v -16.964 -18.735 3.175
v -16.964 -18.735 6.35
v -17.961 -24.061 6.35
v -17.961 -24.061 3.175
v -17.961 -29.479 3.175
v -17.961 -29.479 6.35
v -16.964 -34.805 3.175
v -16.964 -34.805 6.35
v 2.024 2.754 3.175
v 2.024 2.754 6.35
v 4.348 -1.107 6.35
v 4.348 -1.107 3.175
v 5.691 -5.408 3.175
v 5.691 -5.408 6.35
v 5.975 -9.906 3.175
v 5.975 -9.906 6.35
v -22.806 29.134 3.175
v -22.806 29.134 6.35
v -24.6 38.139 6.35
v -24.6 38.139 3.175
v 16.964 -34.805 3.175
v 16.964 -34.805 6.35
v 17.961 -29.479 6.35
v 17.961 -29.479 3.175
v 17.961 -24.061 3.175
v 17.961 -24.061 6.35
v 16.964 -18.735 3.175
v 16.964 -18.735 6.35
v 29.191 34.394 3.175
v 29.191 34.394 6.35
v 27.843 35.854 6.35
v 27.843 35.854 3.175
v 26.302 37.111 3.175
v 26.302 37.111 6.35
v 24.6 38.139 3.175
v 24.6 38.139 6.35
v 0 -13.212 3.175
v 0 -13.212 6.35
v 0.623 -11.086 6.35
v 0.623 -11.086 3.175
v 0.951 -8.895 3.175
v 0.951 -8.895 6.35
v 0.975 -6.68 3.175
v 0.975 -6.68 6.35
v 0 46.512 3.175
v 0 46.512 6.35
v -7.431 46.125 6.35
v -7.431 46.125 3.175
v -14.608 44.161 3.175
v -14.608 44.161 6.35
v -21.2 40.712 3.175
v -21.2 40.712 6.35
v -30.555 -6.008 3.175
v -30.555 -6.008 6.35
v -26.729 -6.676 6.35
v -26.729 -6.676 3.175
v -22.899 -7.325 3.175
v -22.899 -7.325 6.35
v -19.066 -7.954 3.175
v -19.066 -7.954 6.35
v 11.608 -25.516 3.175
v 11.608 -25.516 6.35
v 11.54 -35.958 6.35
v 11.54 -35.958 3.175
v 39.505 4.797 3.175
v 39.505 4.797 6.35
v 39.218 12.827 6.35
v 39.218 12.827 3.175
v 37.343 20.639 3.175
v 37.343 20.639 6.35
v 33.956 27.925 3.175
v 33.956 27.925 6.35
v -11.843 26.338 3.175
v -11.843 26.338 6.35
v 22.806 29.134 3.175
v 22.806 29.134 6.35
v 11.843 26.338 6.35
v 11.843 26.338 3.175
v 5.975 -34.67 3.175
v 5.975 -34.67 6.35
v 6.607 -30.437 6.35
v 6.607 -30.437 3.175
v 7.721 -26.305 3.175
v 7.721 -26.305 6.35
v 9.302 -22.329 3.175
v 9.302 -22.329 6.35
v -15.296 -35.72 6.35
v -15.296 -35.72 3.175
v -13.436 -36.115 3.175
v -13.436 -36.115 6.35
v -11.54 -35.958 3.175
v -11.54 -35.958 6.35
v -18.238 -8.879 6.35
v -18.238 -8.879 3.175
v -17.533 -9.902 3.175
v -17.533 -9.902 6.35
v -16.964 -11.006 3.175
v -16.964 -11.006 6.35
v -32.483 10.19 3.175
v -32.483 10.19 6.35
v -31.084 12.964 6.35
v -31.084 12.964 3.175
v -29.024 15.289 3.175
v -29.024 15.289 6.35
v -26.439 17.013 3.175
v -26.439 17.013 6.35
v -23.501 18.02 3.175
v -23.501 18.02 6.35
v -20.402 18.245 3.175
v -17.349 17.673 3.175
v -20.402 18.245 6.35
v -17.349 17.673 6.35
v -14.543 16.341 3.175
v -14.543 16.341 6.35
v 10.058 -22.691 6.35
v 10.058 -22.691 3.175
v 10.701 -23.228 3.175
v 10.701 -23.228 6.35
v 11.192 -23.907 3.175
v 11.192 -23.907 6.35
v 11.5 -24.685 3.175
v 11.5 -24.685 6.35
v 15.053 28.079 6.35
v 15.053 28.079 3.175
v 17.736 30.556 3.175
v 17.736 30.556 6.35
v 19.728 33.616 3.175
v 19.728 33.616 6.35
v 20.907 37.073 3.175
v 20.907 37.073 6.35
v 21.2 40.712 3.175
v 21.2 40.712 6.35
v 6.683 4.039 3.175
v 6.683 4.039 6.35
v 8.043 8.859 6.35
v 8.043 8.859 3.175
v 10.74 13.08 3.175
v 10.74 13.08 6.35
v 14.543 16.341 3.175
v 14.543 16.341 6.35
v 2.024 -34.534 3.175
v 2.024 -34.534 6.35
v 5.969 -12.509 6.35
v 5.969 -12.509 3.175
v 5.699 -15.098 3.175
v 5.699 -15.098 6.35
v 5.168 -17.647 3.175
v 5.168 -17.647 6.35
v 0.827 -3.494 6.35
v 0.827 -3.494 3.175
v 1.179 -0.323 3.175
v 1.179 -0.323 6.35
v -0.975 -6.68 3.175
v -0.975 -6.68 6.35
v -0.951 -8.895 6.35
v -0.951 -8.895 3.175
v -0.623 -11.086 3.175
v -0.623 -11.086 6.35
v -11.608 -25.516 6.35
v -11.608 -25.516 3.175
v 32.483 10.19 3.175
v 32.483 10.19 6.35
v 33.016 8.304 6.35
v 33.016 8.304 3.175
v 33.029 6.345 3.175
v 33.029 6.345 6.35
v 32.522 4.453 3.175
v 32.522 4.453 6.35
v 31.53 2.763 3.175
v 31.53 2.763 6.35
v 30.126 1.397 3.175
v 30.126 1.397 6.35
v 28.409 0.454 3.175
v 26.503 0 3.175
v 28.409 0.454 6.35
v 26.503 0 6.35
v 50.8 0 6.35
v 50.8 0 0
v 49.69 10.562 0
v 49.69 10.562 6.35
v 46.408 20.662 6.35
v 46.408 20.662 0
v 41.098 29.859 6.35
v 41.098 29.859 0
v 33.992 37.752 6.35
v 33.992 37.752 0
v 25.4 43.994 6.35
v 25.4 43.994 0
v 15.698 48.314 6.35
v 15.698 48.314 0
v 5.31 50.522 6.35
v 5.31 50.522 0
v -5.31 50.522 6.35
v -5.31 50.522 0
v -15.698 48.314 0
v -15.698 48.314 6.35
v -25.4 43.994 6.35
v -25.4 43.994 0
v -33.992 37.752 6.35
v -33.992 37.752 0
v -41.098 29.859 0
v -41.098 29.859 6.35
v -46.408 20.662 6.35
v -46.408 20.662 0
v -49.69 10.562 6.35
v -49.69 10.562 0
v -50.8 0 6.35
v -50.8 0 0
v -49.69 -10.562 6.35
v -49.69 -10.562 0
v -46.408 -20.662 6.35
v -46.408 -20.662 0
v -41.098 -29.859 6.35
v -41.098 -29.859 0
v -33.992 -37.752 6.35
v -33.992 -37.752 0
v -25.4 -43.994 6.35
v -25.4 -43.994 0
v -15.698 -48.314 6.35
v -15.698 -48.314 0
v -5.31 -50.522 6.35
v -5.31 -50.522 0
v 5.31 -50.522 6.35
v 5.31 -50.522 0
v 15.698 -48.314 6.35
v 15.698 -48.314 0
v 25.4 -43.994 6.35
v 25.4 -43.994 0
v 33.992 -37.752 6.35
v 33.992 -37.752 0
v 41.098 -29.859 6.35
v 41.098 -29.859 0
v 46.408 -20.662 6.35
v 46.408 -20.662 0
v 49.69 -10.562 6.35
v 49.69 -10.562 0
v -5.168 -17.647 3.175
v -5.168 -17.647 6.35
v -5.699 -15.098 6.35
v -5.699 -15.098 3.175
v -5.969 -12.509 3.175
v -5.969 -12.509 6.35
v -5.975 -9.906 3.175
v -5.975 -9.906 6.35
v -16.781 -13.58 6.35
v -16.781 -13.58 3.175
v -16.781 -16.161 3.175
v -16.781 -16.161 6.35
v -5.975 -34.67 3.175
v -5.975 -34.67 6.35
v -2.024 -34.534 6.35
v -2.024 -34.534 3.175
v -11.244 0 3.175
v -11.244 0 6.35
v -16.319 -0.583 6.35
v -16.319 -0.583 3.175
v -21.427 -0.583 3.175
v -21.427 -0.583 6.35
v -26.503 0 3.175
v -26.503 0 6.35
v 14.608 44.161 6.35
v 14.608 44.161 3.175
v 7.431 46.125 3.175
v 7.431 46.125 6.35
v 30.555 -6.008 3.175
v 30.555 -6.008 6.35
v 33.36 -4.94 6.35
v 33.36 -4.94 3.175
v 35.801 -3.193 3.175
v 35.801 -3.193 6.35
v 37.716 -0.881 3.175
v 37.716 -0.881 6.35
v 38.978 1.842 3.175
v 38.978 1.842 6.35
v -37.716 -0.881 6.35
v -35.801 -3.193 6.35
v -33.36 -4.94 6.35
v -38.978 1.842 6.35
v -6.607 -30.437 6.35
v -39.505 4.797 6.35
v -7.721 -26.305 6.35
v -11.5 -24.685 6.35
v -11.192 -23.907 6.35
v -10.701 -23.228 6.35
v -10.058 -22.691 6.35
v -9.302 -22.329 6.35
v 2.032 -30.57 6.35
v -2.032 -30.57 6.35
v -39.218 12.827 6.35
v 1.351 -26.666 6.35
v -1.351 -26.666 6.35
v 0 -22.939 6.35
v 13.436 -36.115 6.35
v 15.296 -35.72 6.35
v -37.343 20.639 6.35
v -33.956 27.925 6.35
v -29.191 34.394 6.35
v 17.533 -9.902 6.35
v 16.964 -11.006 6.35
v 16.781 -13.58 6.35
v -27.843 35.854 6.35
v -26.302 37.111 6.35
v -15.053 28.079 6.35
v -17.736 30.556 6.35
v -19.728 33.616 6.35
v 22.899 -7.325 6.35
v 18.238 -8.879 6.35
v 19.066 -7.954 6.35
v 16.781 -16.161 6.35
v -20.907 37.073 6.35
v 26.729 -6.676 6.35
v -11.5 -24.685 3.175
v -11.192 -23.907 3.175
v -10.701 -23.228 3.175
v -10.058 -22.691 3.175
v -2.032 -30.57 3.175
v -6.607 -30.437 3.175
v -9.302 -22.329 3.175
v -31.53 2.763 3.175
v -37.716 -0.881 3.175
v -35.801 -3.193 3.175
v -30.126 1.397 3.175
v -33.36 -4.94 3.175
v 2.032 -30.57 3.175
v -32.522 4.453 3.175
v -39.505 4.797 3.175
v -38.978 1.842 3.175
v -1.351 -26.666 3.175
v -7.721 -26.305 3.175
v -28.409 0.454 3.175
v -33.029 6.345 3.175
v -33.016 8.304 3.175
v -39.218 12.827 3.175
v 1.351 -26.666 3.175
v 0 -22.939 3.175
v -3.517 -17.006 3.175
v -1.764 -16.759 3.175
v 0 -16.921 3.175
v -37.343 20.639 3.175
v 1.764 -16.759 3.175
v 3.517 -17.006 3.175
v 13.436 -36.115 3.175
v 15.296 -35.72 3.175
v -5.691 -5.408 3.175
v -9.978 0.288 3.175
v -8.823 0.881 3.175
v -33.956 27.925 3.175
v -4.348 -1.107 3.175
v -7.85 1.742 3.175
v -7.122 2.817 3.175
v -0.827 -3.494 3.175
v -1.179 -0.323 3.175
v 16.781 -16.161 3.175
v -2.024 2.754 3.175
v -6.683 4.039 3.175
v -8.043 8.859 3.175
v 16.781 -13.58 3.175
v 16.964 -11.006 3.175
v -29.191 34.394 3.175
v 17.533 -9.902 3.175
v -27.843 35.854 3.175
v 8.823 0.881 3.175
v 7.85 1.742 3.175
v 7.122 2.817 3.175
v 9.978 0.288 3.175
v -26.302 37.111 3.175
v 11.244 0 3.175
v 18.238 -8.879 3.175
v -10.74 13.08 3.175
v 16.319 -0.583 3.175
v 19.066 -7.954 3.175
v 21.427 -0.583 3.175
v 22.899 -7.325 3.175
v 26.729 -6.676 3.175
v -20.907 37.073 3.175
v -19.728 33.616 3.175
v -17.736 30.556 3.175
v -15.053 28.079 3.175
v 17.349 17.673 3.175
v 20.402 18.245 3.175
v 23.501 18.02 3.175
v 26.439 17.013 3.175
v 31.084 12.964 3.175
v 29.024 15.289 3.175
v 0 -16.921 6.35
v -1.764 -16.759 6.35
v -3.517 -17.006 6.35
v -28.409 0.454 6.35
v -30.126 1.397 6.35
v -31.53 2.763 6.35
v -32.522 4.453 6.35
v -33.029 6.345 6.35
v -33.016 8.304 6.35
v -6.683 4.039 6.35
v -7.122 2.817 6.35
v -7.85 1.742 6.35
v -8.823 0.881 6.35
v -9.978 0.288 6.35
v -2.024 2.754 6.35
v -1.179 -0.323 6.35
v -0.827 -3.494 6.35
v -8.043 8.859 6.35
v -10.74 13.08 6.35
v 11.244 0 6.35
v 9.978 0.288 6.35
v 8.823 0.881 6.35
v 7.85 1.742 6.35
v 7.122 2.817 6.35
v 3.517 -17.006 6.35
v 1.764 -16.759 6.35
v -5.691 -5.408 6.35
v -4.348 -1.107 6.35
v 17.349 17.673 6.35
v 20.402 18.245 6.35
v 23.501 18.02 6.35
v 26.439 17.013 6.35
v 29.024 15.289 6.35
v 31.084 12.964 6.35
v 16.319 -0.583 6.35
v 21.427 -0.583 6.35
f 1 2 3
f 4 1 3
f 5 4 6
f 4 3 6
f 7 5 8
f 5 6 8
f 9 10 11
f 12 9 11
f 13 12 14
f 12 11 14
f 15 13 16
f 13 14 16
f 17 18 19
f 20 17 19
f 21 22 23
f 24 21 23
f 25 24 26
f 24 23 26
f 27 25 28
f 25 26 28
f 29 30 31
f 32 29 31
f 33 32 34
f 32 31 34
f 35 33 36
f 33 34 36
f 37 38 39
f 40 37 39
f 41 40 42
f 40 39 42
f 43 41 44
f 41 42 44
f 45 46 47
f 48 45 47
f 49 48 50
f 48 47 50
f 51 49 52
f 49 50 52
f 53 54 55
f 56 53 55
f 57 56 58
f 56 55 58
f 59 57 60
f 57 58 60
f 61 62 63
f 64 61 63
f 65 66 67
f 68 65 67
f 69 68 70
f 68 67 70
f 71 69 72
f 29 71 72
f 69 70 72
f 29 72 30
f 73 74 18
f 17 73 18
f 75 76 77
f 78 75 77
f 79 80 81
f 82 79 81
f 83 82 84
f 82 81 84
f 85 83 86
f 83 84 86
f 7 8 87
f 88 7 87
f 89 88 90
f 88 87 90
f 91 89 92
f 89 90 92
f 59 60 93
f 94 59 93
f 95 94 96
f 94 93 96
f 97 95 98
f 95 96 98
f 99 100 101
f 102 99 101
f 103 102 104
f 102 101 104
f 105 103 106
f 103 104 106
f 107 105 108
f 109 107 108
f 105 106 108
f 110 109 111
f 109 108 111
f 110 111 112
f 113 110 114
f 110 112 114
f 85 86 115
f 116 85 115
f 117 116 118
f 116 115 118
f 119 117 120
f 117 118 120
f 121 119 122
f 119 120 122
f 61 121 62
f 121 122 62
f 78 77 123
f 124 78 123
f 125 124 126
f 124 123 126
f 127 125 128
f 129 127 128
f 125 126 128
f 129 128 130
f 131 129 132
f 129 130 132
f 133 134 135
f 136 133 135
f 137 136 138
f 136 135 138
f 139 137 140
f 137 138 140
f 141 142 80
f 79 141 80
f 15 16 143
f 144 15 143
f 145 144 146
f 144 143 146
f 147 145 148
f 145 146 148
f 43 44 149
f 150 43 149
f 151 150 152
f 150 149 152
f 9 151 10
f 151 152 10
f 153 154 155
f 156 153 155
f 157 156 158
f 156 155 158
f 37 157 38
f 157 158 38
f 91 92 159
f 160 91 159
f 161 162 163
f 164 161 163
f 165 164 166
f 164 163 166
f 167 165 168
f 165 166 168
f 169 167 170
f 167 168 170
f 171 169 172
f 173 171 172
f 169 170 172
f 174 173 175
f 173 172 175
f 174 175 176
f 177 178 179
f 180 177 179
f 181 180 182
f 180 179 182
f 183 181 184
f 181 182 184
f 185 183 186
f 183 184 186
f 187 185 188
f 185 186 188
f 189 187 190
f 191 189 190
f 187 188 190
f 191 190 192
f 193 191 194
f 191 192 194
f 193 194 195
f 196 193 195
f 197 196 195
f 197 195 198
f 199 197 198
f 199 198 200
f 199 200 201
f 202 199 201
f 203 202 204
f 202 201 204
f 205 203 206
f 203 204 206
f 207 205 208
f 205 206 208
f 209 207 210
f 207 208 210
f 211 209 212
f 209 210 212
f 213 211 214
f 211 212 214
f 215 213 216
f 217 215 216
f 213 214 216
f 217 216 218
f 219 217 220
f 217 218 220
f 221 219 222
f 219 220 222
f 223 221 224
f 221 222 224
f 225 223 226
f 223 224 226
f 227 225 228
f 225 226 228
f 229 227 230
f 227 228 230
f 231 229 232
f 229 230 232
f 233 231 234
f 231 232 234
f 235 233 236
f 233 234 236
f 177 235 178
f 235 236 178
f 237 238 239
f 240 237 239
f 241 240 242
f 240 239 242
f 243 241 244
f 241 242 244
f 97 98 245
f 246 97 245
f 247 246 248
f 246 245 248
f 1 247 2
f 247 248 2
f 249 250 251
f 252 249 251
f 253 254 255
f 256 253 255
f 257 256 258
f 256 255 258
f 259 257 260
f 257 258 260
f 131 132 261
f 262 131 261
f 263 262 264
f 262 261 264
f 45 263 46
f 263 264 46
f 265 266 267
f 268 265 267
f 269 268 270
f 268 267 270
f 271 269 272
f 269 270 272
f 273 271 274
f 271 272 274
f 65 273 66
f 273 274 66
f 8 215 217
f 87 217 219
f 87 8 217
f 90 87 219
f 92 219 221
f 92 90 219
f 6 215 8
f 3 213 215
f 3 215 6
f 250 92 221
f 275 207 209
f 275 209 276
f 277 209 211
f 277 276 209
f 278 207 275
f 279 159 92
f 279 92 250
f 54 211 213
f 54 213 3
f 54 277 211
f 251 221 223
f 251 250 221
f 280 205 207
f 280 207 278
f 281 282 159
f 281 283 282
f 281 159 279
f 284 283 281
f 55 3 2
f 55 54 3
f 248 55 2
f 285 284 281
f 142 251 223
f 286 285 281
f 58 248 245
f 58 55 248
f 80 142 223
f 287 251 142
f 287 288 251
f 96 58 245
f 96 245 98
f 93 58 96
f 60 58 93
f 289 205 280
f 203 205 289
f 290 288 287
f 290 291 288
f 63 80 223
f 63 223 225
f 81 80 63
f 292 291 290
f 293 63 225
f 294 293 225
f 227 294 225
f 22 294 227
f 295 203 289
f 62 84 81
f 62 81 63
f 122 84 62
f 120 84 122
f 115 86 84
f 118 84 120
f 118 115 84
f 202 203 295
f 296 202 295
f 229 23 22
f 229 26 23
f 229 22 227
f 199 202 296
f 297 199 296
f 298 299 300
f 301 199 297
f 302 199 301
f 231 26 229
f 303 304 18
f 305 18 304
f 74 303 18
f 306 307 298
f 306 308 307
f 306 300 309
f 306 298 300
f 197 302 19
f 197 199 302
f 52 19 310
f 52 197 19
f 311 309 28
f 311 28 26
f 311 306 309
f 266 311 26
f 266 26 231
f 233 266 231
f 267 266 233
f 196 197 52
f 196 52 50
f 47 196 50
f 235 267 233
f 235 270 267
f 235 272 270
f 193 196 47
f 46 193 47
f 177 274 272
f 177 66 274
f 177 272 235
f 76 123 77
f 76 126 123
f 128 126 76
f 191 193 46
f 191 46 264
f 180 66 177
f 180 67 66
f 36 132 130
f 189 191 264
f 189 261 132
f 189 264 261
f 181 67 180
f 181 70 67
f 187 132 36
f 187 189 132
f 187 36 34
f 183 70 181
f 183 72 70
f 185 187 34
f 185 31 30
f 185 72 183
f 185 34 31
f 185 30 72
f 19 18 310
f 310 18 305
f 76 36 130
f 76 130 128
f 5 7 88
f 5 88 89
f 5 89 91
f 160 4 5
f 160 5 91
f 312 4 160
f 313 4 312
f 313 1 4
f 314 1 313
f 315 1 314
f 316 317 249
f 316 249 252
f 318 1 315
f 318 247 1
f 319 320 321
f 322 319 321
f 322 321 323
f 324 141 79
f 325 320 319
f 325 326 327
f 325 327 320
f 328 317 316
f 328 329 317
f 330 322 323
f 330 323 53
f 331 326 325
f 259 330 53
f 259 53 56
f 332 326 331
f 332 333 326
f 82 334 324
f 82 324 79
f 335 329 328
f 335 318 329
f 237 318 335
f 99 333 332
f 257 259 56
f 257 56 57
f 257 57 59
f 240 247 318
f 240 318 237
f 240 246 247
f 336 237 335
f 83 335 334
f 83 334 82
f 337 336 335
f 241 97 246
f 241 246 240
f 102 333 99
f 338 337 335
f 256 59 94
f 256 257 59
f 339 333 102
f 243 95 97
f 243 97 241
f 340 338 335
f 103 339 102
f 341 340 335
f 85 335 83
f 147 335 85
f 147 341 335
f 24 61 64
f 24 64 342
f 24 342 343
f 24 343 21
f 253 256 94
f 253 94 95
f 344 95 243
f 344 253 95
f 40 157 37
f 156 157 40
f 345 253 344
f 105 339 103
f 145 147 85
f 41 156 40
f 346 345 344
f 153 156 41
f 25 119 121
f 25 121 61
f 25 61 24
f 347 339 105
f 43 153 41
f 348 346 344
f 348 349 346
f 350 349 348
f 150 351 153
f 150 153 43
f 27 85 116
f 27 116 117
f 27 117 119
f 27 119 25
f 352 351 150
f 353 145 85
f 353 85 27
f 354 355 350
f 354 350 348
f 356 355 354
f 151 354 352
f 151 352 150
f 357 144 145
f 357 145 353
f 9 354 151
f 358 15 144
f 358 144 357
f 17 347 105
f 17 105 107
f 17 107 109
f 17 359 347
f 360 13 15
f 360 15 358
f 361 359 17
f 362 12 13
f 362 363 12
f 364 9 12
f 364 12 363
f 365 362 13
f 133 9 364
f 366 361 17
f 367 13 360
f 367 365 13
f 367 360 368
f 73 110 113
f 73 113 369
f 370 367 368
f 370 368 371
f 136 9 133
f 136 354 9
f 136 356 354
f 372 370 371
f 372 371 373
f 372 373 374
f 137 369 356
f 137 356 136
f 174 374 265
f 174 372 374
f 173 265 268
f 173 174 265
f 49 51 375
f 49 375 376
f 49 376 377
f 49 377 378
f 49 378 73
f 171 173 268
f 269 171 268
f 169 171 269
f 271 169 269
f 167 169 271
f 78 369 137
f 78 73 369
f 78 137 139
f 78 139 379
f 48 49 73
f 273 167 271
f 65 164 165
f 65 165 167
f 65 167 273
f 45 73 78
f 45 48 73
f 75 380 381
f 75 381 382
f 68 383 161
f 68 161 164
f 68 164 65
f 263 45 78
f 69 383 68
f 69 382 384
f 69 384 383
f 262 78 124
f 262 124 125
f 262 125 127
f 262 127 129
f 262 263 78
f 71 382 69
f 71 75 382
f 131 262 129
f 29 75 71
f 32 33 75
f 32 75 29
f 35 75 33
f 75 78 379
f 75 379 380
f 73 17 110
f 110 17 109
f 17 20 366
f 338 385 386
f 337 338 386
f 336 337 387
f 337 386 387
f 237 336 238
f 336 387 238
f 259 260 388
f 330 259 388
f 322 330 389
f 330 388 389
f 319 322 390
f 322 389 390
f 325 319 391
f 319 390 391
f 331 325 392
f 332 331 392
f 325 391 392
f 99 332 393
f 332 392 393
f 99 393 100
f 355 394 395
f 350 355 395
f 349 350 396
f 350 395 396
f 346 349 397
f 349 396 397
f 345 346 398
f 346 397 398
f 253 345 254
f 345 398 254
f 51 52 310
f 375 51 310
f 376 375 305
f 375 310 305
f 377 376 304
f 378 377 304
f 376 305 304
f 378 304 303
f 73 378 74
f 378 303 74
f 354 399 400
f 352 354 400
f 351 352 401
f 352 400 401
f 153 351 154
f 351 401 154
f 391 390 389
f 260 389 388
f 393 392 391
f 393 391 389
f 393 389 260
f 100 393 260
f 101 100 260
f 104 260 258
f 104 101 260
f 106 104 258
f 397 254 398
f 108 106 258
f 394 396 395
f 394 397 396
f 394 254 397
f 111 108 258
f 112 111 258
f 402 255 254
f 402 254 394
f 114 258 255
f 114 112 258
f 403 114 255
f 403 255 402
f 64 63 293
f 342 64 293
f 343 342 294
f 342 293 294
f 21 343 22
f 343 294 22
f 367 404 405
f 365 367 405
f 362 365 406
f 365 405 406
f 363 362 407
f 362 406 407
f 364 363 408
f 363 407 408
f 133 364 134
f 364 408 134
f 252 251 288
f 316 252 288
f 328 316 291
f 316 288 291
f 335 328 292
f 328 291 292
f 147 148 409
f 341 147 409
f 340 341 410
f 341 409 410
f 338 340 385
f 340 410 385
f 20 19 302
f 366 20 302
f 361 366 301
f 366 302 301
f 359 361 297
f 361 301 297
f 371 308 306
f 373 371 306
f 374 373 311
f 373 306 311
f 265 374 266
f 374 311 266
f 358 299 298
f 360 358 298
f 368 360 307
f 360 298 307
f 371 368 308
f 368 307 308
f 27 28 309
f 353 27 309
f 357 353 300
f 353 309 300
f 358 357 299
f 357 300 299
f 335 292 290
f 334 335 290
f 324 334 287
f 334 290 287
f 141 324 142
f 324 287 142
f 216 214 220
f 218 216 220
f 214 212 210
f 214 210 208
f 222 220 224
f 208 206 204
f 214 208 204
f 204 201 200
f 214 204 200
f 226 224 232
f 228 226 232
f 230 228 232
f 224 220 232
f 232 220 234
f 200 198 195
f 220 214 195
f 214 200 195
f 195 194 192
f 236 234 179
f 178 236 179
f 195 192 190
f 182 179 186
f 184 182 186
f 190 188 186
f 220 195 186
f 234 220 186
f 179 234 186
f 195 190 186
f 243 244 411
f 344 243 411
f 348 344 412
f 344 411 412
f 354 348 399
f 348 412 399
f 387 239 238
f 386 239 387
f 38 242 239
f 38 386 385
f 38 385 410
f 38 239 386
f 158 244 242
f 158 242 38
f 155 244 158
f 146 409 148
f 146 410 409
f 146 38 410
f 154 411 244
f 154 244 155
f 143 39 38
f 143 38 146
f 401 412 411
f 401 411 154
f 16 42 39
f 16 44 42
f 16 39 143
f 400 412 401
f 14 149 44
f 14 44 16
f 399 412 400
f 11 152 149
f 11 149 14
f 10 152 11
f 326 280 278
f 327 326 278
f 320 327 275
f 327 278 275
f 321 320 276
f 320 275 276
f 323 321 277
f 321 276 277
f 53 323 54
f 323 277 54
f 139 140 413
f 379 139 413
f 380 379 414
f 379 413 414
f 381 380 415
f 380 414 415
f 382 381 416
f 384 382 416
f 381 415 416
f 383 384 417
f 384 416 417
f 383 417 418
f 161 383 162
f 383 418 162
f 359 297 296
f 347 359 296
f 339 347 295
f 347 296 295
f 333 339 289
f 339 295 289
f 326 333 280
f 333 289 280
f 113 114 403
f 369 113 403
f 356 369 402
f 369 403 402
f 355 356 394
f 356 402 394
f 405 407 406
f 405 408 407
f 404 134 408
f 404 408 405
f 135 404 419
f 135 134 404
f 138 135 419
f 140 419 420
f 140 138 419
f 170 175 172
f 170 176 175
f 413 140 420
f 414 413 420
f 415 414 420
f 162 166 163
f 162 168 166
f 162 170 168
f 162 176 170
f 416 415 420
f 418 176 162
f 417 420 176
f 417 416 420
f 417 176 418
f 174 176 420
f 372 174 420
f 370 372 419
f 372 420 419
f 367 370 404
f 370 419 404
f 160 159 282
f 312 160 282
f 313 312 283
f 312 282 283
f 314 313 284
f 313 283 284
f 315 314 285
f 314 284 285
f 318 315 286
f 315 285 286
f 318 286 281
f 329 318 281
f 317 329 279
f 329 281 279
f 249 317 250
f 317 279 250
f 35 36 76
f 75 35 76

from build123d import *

# Parameters (mm, degrees)
F0_R     = 50.8
F1_DEPTH = 6.35
F3_DEPTH = 3.175


with BuildPart() as f1:
    # F0 (on Top) → F1 (new body)
    with BuildSketch(Plane.XY):
        Circle(F0_R)
    extrude(amount=F1_DEPTH)

    # F2 (on face) → F3 (cut)
    with BuildSketch(Plane.XY.offset(6.35)):
        with BuildLine():
            ThreePointArc((-2.023529, -34.533925), (-1.777175, -28.603001), (0, -22.939239))
            ThreePointArc((0, -22.939239), (1.777175, -28.603001), (2.023529, -34.533925))
            Line((2.023529, -34.533925), (5.974615, -34.669533))
            ThreePointArc((5.974615, -34.669533), (7.104242, -28.355202), (9.302336, -22.328991))
            ThreePointArc((9.302336, -22.328991), (10.967211, -23.551895), (11.607712, -25.515836))
            Line((11.607712, -25.515836), (11.539907, -35.957832))
            ThreePointArc((11.539907, -35.957832), (14.380524, -35.985773), (16.96432, -34.805145))
            ThreePointArc((16.96432, -34.805145), (18.085967, -26.770231), (16.96432, -18.735318))
            ThreePointArc((16.96432, -18.735318), (16.7578, -14.870423), (16.96432, -11.005528))
            ThreePointArc((16.96432, -11.005528), (17.869083, -9.379184), (19.066282, -7.954295))
            ThreePointArc((19.066282, -7.954295), (24.814172, -7.002965), (30.554628, -6.007752))
            ThreePointArc((30.554628, -6.007752), (36.833108, -2.099002), (39.505046, 4.797257))
            ThreePointArc((39.505046, 4.797257), (37.343339, 20.639318), (29.19136, 34.393921))
            ThreePointArc((29.19136, 34.393921), (27.094397, 36.509907), (24.600387, 38.139191))
            Line((24.600387, 38.139191), (22.805873, 29.13427))
            Line((22.805873, 29.13427), (11.843341, 26.337616))
            ThreePointArc((11.843341, 26.337616), (18.827134, 32.024386), (21.200456, 40.712312))
            ThreePointArc((21.200456, 40.712312), (11.071856, 45.336169), (0, 46.512008))
            ThreePointArc((0, 46.512008), (-11.071856, 45.336169), (-21.200456, 40.712312))
            ThreePointArc((-21.200456, 40.712312), (-18.827134, 32.024386), (-11.843341, 26.337616))
            Line((-11.843341, 26.337616), (-22.805873, 29.13427))
            Line((-22.805873, 29.13427), (-24.600387, 38.139191))
            ThreePointArc((-24.600387, 38.139191), (-27.094397, 36.509907), (-29.19136, 34.393921))
            ThreePointArc((-29.19136, 34.393921), (-37.343339, 20.639318), (-39.505046, 4.797257))
            ThreePointArc((-39.505046, 4.797257), (-36.833108, -2.099002), (-30.554628, -6.007752))
            ThreePointArc((-30.554628, -6.007752), (-24.814172, -7.002965), (-19.066282, -7.954295))
            ThreePointArc((-19.066282, -7.954295), (-17.869083, -9.379184), (-16.96432, -11.005528))
            ThreePointArc((-16.96432, -11.005528), (-16.7578, -14.870423), (-16.96432, -18.735318))
            ThreePointArc((-16.96432, -18.735318), (-18.085967, -26.770231), (-16.96432, -34.805145))
            ThreePointArc((-16.96432, -34.805145), (-14.380524, -35.985773), (-11.539907, -35.957832))
            Line((-11.539907, -35.957832), (-11.607712, -25.515836))
            ThreePointArc((-11.607712, -25.515836), (-10.967211, -23.551895), (-9.302336, -22.328991))
            ThreePointArc((-9.302336, -22.328991), (-7.104242, -28.355202), (-5.974615, -34.669533))
            Line((-5.974615, -34.669533), (-2.023529, -34.533925))
        make_face()
        with BuildLine():
            ThreePointArc((-2.023529, 2.753796), (-0.940643, -1.901231), (-0.975282, -6.680429))
            ThreePointArc((-0.975282, -6.680429), (-0.824525, -9.996426), (0, -13.211815))
            ThreePointArc((0, -13.211815), (0.824525, -9.996426), (0.975282, -6.680429))
            ThreePointArc((0.975282, -6.680429), (0.940643, -1.901231), (2.023529, 2.753796))
            ThreePointArc((2.023529, 2.753796), (5.148448, -3.217282), (5.974615, -9.905805))
            ThreePointArc((5.974615, -9.905805), (5.866823, -13.807024), (5.168271, -17.646706))
            ThreePointArc((5.168271, -17.646706), (2.647612, -16.831793), (0, -16.920999))
            ThreePointArc((0, -16.920999), (-2.647612, -16.831793), (-5.168271, -17.646706))
            ThreePointArc((-5.168271, -17.646706), (-5.866823, -13.807024), (-5.974615, -9.905805))
            ThreePointArc((-5.974615, -9.905805), (-5.148448, -3.217282), (-2.023529, 2.753796))
        make_face(mode=Mode.SUBTRACT)
        with BuildLine():
            ThreePointArc((-26.502606, 0), (-32.082928, 3.574671), (-32.482646, 10.189692))
            ThreePointArc((-32.482646, 10.189692), (-25.002638, 17.61113), (-14.542522, 16.340593))
            ThreePointArc((-14.542522, 16.340593), (-9.236558, 11.068946), (-6.683039, 4.038792))
            ThreePointArc((-6.683039, 4.038792), (-8.309473, 1.28099), (-11.243723, 0))
            ThreePointArc((-11.243723, 0), (-18.873164, -0.655974), (-26.502606, 0))
        make_face(mode=Mode.SUBTRACT)
        with BuildLine():
            ThreePointArc((11.243723, 0), (8.309473, 1.28099), (6.683039, 4.038792))
            ThreePointArc((6.683039, 4.038792), (9.236558, 11.068946), (14.542522, 16.340593))
            ThreePointArc((14.542522, 16.340593), (25.002638, 17.61113), (32.482646, 10.189692))
            ThreePointArc((32.482646, 10.189692), (32.082928, 3.574671), (26.502606, 0))
            ThreePointArc((26.502606, 0), (18.873164, -0.655974), (11.243723, 0))
        make_face(mode=Mode.SUBTRACT)
    extrude(amount=-F3_DEPTH, mode=Mode.SUBTRACT)


solid = f1.part
